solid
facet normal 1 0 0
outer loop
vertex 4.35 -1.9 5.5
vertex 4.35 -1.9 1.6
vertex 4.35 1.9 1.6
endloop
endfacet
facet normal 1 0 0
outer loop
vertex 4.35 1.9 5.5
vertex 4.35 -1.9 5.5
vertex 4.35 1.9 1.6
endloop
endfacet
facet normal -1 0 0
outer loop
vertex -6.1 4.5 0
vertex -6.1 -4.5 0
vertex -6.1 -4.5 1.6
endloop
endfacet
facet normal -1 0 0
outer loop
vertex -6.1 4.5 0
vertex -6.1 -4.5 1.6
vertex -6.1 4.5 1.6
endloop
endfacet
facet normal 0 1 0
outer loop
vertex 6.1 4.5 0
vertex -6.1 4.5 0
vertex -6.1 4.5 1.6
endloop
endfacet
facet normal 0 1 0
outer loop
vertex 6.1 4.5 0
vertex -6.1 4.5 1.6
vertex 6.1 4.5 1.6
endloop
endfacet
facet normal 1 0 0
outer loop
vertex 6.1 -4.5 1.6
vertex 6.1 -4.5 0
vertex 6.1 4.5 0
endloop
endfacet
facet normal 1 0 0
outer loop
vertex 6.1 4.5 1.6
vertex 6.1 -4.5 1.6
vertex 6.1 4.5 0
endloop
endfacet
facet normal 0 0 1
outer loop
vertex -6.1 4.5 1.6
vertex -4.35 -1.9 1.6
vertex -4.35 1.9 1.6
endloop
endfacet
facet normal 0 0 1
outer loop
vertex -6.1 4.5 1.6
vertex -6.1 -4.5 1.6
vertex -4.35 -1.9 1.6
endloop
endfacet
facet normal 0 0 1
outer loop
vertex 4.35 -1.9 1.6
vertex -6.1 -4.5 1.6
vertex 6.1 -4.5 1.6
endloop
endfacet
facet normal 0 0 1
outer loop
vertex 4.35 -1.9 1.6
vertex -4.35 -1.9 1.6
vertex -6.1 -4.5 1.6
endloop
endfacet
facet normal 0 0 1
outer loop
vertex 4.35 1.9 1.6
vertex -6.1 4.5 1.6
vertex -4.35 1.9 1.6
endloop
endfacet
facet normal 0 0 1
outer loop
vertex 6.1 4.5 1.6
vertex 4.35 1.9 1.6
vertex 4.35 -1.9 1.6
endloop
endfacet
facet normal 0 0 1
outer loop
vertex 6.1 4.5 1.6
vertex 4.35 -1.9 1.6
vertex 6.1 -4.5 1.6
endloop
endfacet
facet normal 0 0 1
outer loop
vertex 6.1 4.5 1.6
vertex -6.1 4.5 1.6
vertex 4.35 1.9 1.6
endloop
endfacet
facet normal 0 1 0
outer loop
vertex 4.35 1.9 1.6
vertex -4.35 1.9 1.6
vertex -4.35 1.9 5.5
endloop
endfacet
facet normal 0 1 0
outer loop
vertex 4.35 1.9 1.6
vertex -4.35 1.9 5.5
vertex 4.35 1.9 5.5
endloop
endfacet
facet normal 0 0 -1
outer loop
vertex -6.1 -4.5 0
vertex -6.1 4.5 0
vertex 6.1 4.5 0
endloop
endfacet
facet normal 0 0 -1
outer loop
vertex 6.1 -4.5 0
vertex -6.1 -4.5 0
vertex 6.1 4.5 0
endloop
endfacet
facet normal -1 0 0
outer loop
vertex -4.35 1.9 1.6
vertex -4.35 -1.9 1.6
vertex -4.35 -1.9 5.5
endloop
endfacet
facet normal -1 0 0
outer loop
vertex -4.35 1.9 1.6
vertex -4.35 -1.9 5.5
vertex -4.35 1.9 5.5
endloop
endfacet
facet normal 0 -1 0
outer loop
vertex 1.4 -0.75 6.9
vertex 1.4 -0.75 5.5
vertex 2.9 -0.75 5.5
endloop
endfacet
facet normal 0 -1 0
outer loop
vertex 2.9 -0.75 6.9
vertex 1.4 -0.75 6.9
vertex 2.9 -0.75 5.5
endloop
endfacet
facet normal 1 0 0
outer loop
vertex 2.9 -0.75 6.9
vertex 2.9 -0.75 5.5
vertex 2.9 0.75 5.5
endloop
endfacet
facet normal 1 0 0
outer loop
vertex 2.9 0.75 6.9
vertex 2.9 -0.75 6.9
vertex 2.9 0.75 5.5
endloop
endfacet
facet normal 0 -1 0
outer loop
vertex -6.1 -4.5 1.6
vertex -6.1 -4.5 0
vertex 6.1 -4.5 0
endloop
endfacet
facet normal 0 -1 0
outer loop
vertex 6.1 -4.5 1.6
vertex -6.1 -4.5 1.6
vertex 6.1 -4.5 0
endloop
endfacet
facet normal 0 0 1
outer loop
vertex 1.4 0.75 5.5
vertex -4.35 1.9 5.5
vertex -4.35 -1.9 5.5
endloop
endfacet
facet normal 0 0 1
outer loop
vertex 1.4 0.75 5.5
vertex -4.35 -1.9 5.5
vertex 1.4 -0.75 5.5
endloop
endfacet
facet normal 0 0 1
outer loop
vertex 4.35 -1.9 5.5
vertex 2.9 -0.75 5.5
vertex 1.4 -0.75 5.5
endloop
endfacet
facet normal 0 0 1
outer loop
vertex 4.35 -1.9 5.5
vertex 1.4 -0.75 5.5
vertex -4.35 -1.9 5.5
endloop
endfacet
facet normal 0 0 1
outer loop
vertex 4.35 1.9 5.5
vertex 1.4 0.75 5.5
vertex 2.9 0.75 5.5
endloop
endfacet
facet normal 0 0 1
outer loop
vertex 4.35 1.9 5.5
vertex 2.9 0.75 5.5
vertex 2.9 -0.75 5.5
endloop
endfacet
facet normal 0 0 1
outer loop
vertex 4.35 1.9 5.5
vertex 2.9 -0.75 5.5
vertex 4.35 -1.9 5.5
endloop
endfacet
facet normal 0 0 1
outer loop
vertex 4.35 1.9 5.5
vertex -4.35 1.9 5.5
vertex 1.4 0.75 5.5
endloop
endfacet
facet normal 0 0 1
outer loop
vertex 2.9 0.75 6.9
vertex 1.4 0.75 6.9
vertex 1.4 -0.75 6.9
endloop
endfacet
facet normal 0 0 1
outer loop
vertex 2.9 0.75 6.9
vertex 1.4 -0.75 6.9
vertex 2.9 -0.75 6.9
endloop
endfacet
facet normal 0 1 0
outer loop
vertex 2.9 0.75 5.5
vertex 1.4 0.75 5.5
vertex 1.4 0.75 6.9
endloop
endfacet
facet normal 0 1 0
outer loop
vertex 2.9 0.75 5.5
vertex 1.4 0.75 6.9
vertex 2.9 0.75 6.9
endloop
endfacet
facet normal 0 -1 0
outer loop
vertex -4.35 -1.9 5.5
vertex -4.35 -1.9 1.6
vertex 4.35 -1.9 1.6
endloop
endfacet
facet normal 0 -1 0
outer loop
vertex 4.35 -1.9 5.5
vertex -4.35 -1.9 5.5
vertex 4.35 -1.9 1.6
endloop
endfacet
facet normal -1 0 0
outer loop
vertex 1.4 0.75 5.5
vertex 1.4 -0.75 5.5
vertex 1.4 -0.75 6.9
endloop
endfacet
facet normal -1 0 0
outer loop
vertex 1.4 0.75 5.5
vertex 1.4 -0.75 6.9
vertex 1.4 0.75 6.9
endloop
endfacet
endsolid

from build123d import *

# Parameters (mm, degrees)
SKETCH_W     = 12.2
SKETCH_H     = 9
PAD_DEPTH    = 1.6
SKETCH001_W  = 8.7
SKETCH001_H  = 3.8
PAD001_DEPTH = 3.9
SKETCH002_W  = 1.5
SKETCH002_H  = 1.5
PAD002_DEPTH = 1.4


with BuildPart() as part:
    # Sketch → Pad (new body)
    with BuildSketch(Plane.XY):
        Rectangle(SKETCH_W, SKETCH_H)
    extrude(amount=PAD_DEPTH)

    # Sketch001 → Pad001 (new body)
    with BuildSketch(Plane.XY.offset(1.6)):
        Rectangle(SKETCH001_W, SKETCH001_H)
    extrude(amount=PAD001_DEPTH)

    # Sketch002 → Pad002 (new body)
    with BuildSketch(Plane.XY.offset(5.5)):
        with Locations((2.15, 0)):
            Rectangle(SKETCH002_W, SKETCH002_H)
    extrude(amount=PAD002_DEPTH)


solid = part.part
